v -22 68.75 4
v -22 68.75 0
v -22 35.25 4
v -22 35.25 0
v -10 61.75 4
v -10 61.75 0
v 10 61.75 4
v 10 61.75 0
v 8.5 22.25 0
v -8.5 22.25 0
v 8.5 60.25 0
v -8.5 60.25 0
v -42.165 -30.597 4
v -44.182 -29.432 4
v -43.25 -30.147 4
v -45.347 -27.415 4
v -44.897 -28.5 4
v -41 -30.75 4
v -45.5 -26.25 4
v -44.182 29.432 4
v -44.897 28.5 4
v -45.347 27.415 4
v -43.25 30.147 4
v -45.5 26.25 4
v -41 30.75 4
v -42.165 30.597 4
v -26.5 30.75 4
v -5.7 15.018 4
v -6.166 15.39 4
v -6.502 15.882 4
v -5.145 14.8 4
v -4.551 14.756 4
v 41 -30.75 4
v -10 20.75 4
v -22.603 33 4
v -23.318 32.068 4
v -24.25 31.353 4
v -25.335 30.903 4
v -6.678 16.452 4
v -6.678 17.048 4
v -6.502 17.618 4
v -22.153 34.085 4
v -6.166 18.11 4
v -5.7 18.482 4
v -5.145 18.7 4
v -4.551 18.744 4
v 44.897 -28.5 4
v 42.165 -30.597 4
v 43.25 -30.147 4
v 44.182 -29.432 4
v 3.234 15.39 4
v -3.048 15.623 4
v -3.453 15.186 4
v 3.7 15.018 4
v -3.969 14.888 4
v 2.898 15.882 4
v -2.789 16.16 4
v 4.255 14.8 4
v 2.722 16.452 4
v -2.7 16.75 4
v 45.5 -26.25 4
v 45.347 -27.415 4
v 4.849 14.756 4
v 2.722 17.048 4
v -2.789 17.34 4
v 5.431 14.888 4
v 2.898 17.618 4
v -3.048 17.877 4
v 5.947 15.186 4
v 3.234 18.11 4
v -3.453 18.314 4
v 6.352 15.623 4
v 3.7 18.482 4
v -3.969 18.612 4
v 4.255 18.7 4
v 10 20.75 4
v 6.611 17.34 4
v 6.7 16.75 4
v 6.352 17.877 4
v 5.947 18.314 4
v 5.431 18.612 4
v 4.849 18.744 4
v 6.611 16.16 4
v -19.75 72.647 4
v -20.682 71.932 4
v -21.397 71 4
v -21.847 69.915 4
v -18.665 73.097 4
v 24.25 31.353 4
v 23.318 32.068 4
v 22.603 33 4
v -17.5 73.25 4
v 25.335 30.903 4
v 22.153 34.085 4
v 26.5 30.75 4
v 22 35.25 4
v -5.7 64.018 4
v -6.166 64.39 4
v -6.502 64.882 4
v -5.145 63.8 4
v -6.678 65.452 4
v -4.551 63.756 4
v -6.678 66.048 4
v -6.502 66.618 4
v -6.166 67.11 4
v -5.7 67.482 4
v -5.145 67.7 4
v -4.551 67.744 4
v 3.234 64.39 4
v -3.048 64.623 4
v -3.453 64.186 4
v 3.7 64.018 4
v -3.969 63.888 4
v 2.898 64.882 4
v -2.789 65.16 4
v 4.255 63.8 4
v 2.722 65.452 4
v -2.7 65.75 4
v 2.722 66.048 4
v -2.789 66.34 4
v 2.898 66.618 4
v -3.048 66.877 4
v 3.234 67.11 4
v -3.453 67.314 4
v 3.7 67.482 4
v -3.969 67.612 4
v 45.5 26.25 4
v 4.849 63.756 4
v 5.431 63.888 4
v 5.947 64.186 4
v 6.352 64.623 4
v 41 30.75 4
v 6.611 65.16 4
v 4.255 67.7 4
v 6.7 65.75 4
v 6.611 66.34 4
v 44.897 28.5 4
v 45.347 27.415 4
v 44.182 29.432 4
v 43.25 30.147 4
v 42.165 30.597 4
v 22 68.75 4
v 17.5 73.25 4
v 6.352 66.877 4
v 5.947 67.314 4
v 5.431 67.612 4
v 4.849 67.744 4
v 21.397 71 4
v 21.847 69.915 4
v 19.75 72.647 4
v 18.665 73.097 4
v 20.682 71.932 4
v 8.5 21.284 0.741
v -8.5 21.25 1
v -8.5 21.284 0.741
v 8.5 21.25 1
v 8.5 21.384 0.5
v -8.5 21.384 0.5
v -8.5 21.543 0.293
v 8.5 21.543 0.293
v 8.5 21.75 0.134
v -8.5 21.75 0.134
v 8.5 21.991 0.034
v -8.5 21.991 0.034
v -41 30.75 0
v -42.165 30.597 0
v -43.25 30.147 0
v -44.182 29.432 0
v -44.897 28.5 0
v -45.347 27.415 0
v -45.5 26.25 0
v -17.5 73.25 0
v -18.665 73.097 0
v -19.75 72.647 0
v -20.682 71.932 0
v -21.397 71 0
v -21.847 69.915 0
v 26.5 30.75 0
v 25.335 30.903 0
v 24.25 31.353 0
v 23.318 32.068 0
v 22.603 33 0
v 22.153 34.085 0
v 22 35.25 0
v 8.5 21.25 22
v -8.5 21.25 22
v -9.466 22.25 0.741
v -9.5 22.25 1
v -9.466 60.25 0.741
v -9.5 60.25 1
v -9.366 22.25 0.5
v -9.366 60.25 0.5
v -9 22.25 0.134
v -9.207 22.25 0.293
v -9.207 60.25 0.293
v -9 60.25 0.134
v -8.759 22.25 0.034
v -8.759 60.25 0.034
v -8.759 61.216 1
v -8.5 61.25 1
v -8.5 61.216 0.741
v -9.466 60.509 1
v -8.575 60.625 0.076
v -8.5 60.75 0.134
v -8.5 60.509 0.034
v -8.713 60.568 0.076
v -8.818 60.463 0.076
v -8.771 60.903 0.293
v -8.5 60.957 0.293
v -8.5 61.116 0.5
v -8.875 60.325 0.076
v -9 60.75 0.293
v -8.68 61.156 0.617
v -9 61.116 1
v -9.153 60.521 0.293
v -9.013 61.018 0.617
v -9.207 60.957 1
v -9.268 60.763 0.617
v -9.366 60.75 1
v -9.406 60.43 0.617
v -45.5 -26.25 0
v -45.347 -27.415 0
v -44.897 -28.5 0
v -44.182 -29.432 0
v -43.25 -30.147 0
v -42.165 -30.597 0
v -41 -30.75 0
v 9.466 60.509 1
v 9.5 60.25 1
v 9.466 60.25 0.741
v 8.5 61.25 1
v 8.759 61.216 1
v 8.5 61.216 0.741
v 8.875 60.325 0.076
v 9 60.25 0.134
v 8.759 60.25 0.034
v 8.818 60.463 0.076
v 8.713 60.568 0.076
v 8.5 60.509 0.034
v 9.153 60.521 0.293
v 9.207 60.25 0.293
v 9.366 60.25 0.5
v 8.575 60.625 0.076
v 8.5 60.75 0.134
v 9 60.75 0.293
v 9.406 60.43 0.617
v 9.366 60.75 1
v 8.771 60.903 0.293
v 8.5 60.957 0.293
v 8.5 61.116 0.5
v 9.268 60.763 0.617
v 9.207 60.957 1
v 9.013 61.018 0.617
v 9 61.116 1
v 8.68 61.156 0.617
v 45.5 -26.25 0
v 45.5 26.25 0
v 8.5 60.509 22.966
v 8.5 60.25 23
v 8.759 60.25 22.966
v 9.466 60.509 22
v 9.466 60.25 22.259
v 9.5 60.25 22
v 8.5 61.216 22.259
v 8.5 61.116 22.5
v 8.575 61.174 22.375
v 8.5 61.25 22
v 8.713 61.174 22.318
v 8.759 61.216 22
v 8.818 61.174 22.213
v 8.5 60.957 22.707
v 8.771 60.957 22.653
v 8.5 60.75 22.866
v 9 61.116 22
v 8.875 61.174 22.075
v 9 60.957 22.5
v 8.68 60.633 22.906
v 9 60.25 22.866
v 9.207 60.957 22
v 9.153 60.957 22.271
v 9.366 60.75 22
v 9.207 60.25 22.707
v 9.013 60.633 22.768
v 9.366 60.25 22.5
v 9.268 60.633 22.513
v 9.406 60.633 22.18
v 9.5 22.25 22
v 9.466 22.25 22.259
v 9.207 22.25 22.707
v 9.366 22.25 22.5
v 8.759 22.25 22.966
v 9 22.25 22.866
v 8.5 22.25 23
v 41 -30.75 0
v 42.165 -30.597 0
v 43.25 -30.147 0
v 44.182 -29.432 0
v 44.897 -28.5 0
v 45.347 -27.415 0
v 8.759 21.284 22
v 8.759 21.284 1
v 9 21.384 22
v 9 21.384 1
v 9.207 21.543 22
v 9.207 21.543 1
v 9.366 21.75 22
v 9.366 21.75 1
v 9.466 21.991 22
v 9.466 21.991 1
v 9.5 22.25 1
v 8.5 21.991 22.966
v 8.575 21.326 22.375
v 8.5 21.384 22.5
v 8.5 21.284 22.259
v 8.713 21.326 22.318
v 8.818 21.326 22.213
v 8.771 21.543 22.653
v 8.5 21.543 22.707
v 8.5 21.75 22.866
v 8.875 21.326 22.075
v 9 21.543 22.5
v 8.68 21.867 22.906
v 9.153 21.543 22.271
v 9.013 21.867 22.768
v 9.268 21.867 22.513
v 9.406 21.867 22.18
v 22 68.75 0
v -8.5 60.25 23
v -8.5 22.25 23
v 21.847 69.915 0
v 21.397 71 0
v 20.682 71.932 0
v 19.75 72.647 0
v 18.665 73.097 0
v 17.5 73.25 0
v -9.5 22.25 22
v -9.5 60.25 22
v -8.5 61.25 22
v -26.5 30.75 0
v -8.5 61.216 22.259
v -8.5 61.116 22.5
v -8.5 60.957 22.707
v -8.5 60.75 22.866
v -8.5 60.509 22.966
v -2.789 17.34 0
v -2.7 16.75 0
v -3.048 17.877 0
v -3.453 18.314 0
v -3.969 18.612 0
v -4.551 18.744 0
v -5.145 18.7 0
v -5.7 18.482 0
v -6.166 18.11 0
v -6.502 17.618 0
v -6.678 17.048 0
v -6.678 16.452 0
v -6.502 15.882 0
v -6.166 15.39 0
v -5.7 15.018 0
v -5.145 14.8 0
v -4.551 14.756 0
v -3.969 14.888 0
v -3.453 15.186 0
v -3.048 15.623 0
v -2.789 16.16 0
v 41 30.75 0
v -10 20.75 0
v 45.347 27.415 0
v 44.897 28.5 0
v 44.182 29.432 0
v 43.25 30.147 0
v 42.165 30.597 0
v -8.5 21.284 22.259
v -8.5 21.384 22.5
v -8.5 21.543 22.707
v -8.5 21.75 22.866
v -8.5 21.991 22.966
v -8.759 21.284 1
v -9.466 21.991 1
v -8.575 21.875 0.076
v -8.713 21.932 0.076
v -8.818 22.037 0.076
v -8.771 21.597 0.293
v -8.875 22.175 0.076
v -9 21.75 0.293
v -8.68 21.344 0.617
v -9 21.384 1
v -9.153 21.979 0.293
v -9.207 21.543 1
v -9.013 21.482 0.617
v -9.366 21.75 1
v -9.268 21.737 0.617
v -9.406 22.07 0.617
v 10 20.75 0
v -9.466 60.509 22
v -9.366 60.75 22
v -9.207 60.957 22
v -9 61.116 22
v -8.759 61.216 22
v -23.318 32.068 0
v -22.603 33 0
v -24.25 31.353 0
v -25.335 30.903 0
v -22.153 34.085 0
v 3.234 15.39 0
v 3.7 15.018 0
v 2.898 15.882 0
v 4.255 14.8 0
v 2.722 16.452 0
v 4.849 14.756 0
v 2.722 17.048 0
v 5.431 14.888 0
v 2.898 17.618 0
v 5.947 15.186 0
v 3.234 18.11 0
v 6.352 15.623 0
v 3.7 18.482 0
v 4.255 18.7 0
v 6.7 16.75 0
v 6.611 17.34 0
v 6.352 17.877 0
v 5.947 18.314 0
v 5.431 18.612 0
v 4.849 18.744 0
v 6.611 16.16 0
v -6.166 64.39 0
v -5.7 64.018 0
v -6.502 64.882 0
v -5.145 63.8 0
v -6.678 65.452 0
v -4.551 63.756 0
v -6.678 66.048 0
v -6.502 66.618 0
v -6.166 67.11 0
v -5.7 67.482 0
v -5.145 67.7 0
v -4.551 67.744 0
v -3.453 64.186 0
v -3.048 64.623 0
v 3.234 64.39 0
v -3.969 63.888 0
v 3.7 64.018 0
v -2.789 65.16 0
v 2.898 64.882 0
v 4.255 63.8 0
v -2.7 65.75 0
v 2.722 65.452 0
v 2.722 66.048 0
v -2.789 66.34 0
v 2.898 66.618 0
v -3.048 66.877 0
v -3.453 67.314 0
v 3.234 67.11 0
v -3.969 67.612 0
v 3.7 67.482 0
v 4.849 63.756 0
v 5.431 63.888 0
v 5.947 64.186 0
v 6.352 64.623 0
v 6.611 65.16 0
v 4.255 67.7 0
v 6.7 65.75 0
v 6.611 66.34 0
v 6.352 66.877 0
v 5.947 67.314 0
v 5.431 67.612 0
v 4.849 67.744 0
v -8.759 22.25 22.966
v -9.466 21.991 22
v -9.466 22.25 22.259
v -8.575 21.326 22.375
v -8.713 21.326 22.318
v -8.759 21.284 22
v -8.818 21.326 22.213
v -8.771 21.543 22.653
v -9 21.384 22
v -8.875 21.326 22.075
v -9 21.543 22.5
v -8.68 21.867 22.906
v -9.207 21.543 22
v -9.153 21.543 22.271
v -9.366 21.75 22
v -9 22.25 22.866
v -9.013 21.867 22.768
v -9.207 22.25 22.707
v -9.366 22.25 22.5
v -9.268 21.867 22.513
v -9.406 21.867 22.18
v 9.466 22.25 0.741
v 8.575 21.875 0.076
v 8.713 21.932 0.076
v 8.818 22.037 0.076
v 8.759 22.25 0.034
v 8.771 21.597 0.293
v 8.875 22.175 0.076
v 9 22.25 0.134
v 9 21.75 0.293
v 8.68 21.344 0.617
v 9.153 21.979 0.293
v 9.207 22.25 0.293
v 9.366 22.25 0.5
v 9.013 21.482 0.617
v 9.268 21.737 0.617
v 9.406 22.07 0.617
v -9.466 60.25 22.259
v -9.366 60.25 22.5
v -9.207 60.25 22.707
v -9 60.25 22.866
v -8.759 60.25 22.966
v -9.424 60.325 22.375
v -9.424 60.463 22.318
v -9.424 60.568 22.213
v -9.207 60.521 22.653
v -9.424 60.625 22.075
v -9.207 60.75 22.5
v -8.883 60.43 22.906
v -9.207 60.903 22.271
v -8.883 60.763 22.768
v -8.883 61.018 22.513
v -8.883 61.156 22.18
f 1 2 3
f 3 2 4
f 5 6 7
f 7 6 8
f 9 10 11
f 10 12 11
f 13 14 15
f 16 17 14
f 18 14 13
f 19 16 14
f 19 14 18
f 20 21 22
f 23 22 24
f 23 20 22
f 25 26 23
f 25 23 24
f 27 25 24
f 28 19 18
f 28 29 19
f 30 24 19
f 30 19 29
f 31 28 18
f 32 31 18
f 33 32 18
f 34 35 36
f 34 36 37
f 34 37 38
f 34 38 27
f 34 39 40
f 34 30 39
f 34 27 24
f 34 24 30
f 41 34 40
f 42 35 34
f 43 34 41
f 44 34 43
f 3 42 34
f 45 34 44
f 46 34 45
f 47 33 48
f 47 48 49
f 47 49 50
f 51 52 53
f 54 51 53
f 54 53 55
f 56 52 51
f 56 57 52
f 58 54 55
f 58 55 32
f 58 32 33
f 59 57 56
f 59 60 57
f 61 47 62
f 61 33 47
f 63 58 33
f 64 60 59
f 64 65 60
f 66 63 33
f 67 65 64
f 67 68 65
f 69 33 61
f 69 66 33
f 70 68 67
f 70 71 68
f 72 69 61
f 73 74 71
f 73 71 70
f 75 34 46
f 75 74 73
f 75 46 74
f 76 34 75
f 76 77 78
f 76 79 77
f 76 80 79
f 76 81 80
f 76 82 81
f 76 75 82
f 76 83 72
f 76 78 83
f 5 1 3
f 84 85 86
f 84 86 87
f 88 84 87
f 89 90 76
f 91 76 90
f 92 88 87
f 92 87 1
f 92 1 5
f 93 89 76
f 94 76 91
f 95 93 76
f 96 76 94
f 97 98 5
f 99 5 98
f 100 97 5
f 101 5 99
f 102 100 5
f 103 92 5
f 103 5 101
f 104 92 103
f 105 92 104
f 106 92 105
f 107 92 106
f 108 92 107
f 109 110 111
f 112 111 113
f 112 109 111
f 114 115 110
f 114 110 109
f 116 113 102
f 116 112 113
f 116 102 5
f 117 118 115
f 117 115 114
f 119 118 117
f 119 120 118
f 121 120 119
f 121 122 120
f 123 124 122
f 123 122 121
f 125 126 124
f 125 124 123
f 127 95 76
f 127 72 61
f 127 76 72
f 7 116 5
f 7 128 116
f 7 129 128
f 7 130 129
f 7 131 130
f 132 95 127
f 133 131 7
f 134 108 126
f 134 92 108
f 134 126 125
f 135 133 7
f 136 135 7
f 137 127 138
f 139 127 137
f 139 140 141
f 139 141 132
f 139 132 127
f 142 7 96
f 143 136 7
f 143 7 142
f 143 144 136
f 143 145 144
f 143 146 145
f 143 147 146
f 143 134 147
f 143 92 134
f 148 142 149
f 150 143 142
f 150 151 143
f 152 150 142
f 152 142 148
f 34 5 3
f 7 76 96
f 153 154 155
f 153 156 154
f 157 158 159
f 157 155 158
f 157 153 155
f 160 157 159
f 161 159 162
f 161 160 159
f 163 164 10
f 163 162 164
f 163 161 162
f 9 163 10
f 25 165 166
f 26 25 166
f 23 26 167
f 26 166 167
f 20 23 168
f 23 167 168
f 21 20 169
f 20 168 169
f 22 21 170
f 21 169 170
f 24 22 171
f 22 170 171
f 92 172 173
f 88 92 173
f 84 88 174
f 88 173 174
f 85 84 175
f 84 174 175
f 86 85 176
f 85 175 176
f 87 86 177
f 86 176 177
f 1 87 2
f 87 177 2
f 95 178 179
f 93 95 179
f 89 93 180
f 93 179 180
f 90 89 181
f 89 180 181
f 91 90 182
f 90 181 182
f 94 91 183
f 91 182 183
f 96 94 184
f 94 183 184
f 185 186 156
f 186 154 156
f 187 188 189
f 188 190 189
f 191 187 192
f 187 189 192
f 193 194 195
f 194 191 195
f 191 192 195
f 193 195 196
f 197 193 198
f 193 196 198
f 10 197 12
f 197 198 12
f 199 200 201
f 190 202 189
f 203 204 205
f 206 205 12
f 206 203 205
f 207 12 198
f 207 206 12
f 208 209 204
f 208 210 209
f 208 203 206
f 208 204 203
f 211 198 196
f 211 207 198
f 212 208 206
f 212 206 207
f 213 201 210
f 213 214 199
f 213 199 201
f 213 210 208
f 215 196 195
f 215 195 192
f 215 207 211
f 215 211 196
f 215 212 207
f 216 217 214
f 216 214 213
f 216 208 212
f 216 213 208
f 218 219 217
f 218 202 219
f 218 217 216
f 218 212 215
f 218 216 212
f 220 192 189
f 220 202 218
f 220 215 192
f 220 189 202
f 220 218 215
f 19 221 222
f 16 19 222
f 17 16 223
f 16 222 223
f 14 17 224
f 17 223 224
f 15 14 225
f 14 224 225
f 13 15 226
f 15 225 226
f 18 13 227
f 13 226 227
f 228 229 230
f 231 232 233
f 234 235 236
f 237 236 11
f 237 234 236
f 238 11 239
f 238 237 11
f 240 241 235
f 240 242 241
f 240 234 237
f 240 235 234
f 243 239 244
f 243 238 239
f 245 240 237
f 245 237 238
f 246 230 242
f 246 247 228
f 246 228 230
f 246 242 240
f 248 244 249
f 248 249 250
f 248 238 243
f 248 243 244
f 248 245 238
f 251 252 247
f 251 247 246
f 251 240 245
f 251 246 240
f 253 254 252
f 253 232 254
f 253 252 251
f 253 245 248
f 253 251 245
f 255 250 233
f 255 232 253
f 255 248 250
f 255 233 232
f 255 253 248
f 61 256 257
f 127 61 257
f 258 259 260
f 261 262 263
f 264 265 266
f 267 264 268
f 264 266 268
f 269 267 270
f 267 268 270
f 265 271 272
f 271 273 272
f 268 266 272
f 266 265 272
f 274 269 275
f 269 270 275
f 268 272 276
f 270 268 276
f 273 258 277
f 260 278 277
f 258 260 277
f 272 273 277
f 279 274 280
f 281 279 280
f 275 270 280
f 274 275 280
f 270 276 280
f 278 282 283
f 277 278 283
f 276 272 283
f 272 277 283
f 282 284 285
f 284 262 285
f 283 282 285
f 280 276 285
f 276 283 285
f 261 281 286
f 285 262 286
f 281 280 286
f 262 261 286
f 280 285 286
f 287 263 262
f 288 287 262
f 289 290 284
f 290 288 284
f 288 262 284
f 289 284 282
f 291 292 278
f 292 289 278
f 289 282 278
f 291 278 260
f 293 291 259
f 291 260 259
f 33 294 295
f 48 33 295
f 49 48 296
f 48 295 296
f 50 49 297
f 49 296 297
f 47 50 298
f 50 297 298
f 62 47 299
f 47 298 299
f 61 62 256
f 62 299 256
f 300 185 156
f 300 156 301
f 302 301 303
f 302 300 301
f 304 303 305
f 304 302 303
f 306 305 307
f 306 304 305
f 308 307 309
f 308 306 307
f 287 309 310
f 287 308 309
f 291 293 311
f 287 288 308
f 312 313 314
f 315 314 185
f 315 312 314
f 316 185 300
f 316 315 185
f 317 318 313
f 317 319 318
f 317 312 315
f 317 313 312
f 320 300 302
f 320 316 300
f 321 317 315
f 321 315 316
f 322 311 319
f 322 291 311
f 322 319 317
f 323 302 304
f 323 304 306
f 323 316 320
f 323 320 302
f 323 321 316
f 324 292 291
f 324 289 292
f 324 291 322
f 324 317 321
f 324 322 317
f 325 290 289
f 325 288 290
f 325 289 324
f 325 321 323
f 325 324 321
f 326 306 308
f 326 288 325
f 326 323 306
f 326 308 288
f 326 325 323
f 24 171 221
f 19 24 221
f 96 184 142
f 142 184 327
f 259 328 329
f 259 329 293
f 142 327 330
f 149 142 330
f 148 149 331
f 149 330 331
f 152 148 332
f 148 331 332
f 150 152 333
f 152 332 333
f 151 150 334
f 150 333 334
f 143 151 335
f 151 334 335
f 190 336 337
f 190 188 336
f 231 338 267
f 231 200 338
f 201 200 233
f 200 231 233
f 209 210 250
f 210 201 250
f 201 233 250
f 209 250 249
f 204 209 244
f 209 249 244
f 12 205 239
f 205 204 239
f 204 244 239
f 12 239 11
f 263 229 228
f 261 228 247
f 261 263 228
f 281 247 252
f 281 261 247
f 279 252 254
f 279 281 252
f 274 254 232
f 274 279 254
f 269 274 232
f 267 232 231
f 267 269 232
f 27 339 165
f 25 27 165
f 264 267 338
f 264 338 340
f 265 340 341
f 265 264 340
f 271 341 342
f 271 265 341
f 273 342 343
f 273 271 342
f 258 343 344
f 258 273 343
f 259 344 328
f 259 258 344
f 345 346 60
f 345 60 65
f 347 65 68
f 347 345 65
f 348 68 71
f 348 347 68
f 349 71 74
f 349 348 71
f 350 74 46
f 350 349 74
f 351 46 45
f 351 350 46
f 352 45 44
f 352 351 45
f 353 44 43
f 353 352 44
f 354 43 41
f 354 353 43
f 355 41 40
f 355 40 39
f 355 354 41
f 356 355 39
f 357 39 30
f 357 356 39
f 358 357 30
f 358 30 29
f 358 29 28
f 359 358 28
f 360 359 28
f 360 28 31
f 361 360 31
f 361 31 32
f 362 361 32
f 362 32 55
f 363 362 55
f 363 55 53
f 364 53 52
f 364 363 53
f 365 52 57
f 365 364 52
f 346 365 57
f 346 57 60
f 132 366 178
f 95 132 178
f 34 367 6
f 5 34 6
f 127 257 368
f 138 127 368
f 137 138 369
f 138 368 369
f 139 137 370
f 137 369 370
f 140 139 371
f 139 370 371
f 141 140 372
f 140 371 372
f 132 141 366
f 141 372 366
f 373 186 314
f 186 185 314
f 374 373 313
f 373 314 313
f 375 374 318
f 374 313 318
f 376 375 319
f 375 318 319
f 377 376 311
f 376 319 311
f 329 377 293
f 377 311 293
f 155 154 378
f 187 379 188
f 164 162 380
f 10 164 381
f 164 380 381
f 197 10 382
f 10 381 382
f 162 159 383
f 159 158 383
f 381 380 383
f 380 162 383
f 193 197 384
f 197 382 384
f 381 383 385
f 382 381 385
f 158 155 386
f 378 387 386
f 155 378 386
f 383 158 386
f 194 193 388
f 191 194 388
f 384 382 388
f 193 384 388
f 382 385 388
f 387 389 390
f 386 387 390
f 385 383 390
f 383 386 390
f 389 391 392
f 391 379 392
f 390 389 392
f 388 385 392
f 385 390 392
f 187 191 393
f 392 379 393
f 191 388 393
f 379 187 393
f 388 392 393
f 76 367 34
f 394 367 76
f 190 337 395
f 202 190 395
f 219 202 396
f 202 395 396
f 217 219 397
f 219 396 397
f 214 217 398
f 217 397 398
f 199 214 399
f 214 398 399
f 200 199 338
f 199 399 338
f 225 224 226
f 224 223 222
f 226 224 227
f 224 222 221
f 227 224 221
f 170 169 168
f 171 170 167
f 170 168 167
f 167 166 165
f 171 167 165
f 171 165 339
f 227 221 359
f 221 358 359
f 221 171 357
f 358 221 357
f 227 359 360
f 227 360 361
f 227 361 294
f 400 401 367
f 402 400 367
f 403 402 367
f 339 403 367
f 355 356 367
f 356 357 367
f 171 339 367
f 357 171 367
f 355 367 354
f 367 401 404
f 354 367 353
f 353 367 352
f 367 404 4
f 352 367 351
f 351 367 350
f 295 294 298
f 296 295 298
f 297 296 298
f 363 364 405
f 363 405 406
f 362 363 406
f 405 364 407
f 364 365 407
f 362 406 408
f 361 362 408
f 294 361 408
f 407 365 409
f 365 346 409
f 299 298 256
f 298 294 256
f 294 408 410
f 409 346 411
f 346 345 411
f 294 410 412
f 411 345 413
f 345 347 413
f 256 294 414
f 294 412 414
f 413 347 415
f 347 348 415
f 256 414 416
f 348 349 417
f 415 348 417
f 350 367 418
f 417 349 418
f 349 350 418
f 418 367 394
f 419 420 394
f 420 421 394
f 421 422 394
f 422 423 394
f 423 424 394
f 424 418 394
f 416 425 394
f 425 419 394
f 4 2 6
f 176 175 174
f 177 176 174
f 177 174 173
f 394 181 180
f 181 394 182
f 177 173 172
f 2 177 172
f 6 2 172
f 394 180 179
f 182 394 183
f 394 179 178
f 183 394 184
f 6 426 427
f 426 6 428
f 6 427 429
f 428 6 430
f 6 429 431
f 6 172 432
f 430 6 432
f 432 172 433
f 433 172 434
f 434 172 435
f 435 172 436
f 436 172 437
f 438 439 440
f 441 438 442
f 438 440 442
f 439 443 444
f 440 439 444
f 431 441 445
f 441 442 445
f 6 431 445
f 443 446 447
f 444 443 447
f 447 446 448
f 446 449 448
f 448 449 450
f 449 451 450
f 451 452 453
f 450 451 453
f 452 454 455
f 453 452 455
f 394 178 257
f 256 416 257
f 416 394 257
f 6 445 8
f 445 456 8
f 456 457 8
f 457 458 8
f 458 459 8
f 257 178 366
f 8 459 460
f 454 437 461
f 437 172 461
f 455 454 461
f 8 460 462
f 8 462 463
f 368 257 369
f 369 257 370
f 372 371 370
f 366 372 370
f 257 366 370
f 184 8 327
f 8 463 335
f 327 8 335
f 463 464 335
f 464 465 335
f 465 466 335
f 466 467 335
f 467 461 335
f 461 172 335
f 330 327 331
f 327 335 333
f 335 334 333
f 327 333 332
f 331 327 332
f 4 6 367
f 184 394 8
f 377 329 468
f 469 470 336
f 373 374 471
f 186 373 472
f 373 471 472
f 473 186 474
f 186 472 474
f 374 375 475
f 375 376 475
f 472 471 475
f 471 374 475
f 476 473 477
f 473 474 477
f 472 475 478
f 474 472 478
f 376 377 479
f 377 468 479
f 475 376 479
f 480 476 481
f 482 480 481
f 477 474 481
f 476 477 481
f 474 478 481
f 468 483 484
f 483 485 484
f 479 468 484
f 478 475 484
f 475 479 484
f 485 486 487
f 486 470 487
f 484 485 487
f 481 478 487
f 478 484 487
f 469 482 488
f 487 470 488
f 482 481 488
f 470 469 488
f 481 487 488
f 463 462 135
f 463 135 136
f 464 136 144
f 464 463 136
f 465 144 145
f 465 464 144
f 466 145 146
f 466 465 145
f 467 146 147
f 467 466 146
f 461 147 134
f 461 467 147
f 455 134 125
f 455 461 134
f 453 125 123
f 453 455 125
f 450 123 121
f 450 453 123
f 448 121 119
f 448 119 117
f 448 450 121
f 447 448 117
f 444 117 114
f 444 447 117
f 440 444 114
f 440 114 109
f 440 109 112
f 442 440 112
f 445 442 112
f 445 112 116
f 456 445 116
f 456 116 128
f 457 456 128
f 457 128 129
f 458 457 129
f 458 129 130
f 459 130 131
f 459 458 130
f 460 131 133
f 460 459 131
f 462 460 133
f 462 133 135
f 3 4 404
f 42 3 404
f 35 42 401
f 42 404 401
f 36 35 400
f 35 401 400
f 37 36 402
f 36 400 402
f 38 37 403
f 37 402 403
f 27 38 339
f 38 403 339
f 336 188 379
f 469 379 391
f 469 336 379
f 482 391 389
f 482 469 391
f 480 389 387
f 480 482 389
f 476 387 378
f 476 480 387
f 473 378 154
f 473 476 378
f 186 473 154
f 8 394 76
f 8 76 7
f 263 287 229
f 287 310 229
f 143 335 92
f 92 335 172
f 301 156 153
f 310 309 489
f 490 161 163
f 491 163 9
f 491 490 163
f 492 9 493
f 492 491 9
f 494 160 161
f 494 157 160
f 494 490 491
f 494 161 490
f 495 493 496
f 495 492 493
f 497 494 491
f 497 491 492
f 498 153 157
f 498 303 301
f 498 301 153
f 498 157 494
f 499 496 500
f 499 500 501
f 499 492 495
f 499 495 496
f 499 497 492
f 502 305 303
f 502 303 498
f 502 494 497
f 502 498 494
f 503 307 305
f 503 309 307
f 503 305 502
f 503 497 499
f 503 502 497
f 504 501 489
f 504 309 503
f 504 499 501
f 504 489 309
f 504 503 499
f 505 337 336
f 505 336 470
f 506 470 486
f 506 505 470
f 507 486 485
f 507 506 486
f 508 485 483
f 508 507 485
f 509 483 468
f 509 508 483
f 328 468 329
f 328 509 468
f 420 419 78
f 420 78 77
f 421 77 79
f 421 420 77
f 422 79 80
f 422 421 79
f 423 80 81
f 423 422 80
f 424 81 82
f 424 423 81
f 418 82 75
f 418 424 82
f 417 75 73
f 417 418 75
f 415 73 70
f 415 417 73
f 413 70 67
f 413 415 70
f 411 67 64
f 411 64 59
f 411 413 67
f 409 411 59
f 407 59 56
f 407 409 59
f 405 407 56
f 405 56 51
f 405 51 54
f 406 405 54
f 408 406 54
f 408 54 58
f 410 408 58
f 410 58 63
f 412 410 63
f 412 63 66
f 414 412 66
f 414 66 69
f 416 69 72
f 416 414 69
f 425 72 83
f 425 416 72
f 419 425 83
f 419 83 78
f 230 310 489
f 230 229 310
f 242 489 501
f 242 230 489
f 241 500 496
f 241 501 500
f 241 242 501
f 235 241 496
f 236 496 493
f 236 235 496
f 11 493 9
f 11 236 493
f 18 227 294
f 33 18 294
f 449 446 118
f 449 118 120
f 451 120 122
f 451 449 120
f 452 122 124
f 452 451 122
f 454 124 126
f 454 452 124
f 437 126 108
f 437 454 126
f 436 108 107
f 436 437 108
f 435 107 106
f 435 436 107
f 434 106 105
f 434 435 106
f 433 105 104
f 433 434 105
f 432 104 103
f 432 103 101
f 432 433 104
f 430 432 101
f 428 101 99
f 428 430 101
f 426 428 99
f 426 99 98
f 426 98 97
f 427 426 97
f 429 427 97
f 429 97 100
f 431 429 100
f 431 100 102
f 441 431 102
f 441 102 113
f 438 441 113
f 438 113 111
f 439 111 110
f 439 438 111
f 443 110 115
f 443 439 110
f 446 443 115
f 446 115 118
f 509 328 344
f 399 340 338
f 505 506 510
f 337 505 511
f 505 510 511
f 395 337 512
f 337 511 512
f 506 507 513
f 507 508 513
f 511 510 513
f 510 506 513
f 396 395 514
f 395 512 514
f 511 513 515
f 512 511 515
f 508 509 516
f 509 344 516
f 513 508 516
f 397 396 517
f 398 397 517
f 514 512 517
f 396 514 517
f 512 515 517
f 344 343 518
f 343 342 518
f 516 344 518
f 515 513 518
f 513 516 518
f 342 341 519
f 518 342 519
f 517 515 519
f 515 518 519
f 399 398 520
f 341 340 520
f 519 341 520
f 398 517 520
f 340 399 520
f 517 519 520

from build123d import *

# Parameters (mm, degrees)
F0_R     = 2
F0_W     = 20
F0_H     = 41
F1_DEPTH = 4
F2_W     = 19
F2_H     = 40
F3_DEPTH = 23
F4_R     = 1


with BuildPart() as f1:
    # F0 (on Top) → F1 (new body)
    with BuildSketch(Plane.XY):
        with BuildLine():
            Line((-41, -30.75), (41, -30.75))
            ThreePointArc((41, -30.75), (44.181981, -29.431981), (45.5, -26.25))
            Line((45.5, -26.25), (45.5, 26.25))
            ThreePointArc((45.5, 26.25), (44.181981, 29.431981), (41, 30.75))
            Line((41, 30.75), (26.5, 30.75))
            ThreePointArc((26.5, 30.75), (23.318019, 32.068019), (22, 35.25))
            Line((22, 35.25), (22, 68.75))
            ThreePointArc((22, 68.75), (20.681981, 71.931981), (17.5, 73.25))
            Line((17.5, 73.25), (-17.5, 73.25))
            ThreePointArc((-17.5, 73.25), (-20.681981, 71.931981), (-22, 68.75))
            Line((-22, 68.75), (-22, 35.25))
            ThreePointArc((-22, 35.25), (-23.318019, 32.068019), (-26.5, 30.75))
            Line((-26.5, 30.75), (-41, 30.75))
            ThreePointArc((-41, 30.75), (-44.181981, 29.431981), (-45.5, 26.25))
            Line((-45.5, 26.25), (-45.5, -26.25))
            ThreePointArc((-45.5, -26.25), (-44.181981, -29.431981), (-41, -30.75))
        make_face()
        with Locations((-4.7, 16.75)):
            Circle(F0_R, mode=Mode.SUBTRACT)
        with Locations((4.7, 16.75)):
            Circle(F0_R, mode=Mode.SUBTRACT)
        with Locations((-4.7, 65.75)):
            Circle(F0_R, mode=Mode.SUBTRACT)
        with Locations((0, 41.25)):
            Rectangle(F0_W, F0_H, mode=Mode.SUBTRACT)
        with Locations((4.7, 65.75)):
            Circle(F0_R, mode=Mode.SUBTRACT)
    extrude(amount=F1_DEPTH)


with BuildPart() as f3:
    # F2 (on Top) → F3 (new body)
    with BuildSketch(Plane.XY):
        with Locations((0, 41.25)):
            Rectangle(F2_W, F2_H)
    extrude(amount=F3_DEPTH)

    # F4
    f4_edges = [f3.edges().sort_by_distance(p)[0] for p in [
        (9.5, 41.25, 23),
        (0, 61.25, 23),
        (-9.5, 41.25, 23),
        (0, 21.25, 23),
        (-9.5, 21.25, 11.5),
        (9.5, 21.25, 11.5),
        (0, 21.25, 0),
        (9.5, 61.25, 11.5),
        (9.5, 41.25, 0),
        (-9.5, 61.25, 11.5),
        (0, 61.25, 0),
        (-9.5, 41.25, 0),
    ]]
    fillet(f4_edges, radius=F4_R)


solid = Compound([f1.part, f3.part])
